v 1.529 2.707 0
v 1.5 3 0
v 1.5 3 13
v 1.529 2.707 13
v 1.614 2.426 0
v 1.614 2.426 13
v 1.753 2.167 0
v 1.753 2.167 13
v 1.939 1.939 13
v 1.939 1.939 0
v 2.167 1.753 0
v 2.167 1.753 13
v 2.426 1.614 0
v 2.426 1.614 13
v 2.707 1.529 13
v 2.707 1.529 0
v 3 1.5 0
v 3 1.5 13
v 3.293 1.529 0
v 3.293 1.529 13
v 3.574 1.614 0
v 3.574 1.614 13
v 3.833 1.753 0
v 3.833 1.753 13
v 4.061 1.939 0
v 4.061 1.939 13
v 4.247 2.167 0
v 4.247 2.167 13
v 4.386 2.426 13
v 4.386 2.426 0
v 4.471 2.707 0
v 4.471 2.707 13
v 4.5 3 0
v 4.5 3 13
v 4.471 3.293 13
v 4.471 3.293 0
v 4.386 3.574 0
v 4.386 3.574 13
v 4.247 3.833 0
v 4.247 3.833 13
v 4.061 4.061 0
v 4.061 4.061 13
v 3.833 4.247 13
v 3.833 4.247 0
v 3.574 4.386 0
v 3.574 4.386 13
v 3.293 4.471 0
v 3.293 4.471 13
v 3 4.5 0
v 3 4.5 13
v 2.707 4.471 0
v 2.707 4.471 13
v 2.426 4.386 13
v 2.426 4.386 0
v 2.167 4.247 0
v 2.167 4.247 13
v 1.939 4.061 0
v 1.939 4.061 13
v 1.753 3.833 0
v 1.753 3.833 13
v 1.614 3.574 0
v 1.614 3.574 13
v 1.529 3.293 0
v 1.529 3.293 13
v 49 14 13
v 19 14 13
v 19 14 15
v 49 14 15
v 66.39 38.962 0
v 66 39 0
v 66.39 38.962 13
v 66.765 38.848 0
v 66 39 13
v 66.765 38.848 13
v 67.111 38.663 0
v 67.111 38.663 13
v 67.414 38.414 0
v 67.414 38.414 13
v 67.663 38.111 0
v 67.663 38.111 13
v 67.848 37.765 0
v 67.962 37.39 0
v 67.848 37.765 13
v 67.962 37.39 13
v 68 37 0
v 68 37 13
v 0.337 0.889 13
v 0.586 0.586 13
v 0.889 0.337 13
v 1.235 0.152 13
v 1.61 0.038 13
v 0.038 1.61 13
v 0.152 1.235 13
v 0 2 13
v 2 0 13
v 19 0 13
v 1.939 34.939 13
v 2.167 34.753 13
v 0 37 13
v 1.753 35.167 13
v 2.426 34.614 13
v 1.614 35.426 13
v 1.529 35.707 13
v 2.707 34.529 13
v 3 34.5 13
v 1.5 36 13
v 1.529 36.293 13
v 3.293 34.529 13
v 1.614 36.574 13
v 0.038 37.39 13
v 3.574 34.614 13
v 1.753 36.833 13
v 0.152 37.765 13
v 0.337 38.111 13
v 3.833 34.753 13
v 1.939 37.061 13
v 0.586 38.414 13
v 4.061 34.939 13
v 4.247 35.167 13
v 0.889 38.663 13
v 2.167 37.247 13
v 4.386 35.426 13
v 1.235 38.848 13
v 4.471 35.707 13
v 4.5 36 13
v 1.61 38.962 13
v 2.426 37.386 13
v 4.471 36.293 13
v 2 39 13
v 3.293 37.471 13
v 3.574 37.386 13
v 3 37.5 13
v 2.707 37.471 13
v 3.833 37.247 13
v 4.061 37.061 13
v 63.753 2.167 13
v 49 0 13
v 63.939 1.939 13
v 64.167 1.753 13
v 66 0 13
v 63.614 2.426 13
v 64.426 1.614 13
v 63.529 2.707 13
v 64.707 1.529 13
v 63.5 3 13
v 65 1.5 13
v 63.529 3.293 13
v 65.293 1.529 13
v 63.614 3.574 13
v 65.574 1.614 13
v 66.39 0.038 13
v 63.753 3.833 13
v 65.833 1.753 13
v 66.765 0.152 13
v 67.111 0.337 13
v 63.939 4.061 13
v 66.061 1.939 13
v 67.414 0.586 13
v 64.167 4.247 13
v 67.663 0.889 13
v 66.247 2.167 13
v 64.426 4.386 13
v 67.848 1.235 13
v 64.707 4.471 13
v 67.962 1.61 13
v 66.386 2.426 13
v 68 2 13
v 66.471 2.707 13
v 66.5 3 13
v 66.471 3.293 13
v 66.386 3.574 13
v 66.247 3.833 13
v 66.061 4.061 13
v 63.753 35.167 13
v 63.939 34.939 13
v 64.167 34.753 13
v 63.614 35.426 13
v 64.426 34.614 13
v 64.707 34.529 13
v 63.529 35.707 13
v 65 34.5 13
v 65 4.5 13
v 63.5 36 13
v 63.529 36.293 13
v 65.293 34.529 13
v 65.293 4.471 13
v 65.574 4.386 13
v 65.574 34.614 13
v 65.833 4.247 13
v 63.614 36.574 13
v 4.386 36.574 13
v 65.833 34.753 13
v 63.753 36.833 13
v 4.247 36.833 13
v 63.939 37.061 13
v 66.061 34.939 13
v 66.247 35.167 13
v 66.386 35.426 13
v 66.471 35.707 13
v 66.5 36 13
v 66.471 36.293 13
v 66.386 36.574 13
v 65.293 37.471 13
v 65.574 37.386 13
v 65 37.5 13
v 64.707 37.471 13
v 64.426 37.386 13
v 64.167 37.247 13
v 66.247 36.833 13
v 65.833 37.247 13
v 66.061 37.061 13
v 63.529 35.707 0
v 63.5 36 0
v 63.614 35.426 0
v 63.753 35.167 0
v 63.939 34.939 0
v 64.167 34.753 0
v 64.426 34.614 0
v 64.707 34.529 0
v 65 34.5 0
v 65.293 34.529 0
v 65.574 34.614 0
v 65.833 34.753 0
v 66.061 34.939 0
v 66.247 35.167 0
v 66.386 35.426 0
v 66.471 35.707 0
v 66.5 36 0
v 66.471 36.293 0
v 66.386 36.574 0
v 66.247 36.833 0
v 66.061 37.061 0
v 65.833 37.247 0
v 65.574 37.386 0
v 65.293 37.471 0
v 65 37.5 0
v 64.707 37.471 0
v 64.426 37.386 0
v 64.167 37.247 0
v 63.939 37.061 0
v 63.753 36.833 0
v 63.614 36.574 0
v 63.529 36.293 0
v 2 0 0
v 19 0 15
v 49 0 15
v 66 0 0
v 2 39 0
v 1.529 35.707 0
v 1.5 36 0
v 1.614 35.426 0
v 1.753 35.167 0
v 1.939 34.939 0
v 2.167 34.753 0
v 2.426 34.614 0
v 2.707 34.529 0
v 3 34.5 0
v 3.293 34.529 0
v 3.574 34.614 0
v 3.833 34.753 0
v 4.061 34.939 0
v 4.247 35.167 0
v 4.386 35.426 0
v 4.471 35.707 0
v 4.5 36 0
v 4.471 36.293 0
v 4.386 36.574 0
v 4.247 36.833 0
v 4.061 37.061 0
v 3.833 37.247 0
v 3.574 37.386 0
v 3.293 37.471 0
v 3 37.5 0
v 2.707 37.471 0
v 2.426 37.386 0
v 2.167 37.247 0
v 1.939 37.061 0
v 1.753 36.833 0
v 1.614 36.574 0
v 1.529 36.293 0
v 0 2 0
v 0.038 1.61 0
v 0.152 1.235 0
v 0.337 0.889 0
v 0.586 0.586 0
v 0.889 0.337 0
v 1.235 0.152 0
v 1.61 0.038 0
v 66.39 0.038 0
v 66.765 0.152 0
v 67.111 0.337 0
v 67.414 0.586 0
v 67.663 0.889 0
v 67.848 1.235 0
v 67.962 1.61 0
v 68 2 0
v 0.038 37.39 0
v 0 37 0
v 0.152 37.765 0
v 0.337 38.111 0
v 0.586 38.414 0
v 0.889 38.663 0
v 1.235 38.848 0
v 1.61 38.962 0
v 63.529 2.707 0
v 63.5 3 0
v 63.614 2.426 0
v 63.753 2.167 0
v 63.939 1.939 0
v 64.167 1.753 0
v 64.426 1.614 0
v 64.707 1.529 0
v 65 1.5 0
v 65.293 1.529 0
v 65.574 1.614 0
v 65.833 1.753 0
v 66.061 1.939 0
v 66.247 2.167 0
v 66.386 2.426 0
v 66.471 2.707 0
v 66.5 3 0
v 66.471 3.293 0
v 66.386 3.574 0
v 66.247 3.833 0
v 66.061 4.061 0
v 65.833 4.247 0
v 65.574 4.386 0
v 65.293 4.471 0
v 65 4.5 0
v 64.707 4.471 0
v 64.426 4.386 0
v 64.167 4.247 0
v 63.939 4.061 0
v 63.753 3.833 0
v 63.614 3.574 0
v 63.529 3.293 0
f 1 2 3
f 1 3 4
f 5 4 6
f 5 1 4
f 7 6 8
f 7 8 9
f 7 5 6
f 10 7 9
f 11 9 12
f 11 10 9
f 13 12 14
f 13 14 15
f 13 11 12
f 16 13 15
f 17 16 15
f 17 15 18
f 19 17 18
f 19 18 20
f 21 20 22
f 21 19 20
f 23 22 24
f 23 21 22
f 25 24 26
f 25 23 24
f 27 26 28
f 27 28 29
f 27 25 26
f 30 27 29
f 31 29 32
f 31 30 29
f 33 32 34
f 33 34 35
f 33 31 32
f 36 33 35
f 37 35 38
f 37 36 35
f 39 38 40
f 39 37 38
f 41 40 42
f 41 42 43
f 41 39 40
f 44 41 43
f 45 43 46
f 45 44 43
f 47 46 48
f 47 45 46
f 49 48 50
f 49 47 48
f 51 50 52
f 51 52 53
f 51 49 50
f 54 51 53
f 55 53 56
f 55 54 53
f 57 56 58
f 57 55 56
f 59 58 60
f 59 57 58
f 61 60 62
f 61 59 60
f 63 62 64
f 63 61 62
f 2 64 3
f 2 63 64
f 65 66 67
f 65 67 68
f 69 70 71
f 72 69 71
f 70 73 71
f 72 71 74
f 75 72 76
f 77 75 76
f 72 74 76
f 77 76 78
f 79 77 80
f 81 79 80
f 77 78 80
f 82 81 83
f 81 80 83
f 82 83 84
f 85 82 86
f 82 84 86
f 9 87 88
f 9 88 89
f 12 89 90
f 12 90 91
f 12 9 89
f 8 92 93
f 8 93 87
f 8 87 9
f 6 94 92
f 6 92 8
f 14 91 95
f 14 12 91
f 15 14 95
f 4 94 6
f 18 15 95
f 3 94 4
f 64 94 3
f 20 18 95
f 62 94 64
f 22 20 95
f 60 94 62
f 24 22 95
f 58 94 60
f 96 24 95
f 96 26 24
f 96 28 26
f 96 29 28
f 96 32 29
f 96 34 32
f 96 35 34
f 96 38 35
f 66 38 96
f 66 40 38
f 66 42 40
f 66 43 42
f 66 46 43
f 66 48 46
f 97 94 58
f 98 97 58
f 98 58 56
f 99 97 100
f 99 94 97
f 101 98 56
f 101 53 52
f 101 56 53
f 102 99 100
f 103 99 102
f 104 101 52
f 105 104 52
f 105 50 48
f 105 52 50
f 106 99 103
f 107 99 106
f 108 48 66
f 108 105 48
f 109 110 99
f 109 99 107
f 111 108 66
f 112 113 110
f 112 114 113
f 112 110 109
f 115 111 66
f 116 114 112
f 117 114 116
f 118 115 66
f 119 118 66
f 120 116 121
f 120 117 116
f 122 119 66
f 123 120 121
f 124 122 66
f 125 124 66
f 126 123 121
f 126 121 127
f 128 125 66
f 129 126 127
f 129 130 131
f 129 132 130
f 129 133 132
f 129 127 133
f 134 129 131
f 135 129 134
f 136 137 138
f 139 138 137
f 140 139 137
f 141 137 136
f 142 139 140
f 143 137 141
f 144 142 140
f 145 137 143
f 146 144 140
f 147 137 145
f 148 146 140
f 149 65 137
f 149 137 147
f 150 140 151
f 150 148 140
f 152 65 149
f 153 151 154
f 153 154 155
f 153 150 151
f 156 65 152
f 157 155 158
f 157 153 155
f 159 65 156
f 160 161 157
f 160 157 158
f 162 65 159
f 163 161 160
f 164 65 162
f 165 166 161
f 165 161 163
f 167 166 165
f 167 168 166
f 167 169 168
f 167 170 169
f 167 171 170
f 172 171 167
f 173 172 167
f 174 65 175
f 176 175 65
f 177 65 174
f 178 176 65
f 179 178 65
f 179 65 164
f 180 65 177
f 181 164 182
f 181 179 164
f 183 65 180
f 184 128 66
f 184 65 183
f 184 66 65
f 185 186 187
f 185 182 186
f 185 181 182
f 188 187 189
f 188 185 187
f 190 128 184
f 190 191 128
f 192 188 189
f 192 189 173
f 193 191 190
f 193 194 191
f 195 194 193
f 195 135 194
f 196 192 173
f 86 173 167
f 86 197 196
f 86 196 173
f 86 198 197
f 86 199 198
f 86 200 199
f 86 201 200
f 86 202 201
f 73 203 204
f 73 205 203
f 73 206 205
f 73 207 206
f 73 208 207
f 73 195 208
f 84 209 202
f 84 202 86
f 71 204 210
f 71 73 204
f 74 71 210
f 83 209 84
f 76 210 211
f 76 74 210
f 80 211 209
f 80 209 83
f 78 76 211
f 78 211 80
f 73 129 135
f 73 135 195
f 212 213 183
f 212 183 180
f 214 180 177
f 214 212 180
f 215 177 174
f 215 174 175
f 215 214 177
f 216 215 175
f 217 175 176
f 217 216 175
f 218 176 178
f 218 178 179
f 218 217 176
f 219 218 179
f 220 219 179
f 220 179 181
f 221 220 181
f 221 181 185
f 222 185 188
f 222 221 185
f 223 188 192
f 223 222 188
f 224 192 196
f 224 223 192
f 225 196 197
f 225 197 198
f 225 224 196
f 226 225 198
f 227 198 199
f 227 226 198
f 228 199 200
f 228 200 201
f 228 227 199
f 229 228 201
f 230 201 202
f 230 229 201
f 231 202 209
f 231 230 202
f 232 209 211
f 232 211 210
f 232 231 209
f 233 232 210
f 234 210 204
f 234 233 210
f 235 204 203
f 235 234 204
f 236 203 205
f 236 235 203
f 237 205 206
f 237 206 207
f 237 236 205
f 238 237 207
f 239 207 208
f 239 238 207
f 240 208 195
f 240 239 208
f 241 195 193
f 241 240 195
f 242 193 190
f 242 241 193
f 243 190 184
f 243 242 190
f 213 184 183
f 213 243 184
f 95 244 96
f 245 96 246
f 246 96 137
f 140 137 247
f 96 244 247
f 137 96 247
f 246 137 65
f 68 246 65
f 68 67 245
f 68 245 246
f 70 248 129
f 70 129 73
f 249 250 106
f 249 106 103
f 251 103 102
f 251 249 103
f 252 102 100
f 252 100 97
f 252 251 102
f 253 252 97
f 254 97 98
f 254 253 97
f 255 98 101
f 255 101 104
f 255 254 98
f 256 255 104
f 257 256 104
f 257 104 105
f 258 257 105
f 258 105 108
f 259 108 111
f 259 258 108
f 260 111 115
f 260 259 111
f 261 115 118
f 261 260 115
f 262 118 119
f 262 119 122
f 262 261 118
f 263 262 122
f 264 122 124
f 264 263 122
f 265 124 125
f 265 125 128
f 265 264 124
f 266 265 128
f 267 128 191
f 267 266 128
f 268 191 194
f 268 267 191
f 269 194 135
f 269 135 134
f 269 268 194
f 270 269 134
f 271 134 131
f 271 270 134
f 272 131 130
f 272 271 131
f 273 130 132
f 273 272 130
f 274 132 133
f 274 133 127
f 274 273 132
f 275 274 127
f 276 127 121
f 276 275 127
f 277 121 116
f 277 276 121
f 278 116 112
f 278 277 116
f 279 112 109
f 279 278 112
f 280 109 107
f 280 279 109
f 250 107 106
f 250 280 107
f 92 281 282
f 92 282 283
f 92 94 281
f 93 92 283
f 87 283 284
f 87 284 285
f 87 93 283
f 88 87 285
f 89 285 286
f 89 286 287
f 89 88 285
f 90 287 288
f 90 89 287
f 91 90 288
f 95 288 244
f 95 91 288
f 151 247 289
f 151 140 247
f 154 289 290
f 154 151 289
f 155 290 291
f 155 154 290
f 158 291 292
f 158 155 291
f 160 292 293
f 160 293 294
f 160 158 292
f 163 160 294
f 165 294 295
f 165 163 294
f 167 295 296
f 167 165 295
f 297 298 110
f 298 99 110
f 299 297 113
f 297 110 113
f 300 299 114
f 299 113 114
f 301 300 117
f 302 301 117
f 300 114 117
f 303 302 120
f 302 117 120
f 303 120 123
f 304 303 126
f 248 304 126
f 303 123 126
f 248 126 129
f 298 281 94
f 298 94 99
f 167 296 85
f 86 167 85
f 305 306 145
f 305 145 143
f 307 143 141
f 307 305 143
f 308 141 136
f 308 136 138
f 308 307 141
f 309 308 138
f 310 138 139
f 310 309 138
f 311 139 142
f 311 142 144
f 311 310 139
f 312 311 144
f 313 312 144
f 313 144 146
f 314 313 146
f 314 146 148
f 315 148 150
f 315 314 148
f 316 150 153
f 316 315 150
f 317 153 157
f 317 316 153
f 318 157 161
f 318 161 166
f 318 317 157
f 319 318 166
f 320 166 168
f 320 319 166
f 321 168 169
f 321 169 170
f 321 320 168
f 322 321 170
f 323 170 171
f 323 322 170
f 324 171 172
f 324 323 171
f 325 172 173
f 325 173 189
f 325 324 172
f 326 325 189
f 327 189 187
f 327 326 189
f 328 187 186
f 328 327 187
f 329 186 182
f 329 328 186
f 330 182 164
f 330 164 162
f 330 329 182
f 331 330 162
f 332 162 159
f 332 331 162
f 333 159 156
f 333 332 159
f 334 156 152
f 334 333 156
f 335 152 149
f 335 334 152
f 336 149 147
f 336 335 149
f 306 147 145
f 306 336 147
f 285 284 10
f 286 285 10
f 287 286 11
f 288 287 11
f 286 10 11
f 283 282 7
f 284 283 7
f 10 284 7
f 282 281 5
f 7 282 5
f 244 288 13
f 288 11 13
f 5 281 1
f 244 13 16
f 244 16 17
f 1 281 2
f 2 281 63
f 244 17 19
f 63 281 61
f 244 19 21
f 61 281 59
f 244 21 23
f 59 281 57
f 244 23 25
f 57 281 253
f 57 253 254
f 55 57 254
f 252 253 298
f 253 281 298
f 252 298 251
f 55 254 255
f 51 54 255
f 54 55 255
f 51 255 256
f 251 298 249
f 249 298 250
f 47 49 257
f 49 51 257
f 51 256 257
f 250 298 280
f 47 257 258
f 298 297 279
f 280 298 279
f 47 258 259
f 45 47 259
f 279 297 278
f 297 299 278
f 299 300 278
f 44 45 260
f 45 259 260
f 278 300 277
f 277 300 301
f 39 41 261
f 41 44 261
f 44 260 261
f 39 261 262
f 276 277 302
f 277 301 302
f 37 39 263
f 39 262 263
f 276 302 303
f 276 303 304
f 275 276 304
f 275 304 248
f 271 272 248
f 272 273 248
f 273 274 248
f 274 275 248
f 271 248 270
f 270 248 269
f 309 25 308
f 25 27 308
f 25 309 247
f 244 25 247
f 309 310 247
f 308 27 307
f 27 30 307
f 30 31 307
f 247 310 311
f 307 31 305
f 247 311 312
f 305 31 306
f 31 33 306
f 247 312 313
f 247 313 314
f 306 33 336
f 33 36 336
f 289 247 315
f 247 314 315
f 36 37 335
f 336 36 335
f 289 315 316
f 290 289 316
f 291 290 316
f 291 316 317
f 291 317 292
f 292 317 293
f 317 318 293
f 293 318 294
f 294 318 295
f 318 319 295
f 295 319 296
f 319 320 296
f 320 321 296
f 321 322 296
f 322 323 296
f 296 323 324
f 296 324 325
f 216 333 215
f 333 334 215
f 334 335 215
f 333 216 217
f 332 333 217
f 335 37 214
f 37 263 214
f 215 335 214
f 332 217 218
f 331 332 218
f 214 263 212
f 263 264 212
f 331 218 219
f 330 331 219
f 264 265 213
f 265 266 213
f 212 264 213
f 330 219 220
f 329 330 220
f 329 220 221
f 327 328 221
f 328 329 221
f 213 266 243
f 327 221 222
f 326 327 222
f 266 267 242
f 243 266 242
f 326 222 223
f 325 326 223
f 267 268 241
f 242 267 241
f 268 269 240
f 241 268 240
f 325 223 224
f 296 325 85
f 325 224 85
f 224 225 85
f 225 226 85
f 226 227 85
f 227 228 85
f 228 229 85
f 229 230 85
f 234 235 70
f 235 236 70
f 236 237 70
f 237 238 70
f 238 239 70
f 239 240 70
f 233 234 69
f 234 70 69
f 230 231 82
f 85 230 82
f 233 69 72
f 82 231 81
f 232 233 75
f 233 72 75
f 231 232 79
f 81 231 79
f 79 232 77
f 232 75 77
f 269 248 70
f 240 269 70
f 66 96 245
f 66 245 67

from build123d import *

# Parameters (mm, degrees)
CROQUIS1_W              = 68
CROQUIS1_H              = 39
CROQUIS1_R              = 1.5
SALIENTE_EXTRUIR1_DEPTH = 13
REDONDEO1_R             = 2
CROQUIS2_W              = 30
CROQUIS2_H              = 14
SALIENTE_EXTRUIR2_DEPTH = 2


with BuildPart() as part:
    # Croquis1 → Saliente-Extruir1 (new body)
    with BuildSketch(Plane.XY):
        with Locations((34, 19.5)):
            Rectangle(CROQUIS1_W, CROQUIS1_H)
        with Locations(Location((3, 36, 0), (0, 0, 180))):
            Circle(CROQUIS1_R, mode=Mode.SUBTRACT)
        with Locations(Location((3, 3, 0), (0, 0, 180))):
            Circle(CROQUIS1_R, mode=Mode.SUBTRACT)
        with Locations(Location((65, 36, 0), (0, 0, 180))):
            Circle(CROQUIS1_R, mode=Mode.SUBTRACT)
        with Locations(Location((65, 3, 0), (0, 0, 180))):
            Circle(CROQUIS1_R, mode=Mode.SUBTRACT)
    extrude(amount=SALIENTE_EXTRUIR1_DEPTH)

    # Redondeo1
    redondeo1_edges = [part.edges().sort_by_distance(p)[0] for p in [
        (0, 39, 6.5),
        (68, 39, 6.5),
        (68, 0, 6.5),
        (0, 0, 6.5),
    ]]
    fillet(redondeo1_edges, radius=REDONDEO1_R)

    # Croquis2 → Saliente-Extruir2 (add)
    with BuildSketch(Plane.XY.offset(13)):
        with Locations((34, 7)):
            Rectangle(CROQUIS2_W, CROQUIS2_H)
    extrude(amount=SALIENTE_EXTRUIR2_DEPTH)


solid = part.part
